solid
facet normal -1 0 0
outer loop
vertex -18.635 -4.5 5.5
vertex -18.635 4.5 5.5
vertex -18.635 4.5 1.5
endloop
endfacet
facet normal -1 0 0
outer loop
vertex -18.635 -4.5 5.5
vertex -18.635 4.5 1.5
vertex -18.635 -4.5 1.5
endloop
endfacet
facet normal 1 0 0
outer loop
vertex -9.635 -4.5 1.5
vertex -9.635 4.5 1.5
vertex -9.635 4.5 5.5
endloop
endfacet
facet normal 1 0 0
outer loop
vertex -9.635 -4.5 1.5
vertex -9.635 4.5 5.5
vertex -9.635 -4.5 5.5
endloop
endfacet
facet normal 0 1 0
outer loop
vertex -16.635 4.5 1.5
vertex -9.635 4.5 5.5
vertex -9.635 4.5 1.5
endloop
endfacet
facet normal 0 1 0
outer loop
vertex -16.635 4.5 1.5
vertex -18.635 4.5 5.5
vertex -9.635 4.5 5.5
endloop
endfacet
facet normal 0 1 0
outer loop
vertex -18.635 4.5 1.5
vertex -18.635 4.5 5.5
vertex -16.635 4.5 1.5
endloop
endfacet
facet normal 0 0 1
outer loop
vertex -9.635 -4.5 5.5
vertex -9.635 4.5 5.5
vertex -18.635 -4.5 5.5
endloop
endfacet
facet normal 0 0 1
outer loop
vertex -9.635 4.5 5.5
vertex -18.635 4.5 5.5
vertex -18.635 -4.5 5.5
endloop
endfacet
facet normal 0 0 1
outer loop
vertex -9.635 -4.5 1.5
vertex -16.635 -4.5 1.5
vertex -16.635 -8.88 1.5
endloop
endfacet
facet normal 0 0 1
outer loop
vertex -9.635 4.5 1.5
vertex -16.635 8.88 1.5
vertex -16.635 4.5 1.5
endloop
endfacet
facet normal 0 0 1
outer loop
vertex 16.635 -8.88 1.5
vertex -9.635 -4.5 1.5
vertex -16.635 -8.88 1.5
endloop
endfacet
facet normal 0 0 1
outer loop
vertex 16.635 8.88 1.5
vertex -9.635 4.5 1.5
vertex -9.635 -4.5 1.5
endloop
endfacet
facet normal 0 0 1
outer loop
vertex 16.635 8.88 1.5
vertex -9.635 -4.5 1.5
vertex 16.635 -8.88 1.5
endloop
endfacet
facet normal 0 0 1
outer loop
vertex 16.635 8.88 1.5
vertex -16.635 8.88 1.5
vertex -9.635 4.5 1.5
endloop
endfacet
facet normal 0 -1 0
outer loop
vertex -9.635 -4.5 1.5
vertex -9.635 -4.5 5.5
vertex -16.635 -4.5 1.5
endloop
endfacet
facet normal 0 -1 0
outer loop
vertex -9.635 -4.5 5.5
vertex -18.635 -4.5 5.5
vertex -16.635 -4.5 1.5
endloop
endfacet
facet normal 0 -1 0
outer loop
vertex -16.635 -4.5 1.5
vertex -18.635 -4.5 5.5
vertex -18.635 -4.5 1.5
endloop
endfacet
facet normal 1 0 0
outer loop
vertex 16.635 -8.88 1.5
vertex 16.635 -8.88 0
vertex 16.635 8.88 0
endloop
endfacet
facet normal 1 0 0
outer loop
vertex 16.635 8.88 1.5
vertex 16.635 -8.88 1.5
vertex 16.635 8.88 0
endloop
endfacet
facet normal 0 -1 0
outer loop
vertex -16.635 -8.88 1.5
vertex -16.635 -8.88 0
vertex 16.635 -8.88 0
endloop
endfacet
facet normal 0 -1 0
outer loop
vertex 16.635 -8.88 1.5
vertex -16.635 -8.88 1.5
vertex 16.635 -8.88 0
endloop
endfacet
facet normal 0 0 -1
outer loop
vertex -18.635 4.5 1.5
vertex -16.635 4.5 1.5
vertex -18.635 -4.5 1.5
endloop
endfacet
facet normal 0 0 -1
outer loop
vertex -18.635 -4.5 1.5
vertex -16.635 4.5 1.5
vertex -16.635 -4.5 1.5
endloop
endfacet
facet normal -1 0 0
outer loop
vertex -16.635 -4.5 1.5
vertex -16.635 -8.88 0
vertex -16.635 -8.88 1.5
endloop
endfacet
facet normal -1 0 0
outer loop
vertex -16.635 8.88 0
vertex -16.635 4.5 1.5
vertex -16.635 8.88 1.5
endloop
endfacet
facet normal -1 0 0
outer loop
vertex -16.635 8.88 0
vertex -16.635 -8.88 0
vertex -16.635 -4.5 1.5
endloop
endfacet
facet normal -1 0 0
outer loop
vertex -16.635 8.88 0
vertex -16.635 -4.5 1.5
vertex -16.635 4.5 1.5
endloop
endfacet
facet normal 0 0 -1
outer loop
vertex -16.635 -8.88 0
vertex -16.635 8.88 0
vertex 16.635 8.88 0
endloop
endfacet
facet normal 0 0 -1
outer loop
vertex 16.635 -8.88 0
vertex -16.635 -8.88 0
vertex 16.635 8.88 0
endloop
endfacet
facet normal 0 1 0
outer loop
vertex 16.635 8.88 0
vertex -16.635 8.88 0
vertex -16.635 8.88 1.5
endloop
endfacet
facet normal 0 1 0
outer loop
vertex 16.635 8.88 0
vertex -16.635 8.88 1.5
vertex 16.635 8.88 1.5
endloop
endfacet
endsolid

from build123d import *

# Parameters (mm, degrees)
F0_W      = 33.27
F0_H      = 17.76
F1_DEPTH  = 1.5
F2_W      = 9
F2_H      = 4
F3_DEPTH  = 2
F3_FACE_W = 9
F3_FACE_H = 4
F4_DEPTH  = 7


with BuildPart() as f1:
    # F0 (on Top) → F1 (new body)
    with BuildSketch(Plane.XY):
        Rectangle(F0_W, F0_H)
    extrude(amount=F1_DEPTH)



with BuildPart() as f3:
    # F2 (on face) → F3 (new body)
    with BuildSketch(Plane(origin=(-16.635, 0, 0), x_dir=(0, -1, 0), z_dir=(-1, 0, 0))):
        with Locations((0, 3.5)):
            Rectangle(F2_W, F2_H)
    extrude(amount=F3_DEPTH)


with BuildPart() as f1_1:
    add(f1.part)

    add(f3.part)  # F4 merges F3
    # F3_face (on face) → F4 (join)
    with BuildSketch(Plane(origin=(-16.635, 0, 3.5), x_dir=(0, -1, 0), z_dir=(1, 0, 0))):
        Rectangle(F3_FACE_W, F3_FACE_H)
    extrude(amount=F4_DEPTH)


solid = f1_1.part
